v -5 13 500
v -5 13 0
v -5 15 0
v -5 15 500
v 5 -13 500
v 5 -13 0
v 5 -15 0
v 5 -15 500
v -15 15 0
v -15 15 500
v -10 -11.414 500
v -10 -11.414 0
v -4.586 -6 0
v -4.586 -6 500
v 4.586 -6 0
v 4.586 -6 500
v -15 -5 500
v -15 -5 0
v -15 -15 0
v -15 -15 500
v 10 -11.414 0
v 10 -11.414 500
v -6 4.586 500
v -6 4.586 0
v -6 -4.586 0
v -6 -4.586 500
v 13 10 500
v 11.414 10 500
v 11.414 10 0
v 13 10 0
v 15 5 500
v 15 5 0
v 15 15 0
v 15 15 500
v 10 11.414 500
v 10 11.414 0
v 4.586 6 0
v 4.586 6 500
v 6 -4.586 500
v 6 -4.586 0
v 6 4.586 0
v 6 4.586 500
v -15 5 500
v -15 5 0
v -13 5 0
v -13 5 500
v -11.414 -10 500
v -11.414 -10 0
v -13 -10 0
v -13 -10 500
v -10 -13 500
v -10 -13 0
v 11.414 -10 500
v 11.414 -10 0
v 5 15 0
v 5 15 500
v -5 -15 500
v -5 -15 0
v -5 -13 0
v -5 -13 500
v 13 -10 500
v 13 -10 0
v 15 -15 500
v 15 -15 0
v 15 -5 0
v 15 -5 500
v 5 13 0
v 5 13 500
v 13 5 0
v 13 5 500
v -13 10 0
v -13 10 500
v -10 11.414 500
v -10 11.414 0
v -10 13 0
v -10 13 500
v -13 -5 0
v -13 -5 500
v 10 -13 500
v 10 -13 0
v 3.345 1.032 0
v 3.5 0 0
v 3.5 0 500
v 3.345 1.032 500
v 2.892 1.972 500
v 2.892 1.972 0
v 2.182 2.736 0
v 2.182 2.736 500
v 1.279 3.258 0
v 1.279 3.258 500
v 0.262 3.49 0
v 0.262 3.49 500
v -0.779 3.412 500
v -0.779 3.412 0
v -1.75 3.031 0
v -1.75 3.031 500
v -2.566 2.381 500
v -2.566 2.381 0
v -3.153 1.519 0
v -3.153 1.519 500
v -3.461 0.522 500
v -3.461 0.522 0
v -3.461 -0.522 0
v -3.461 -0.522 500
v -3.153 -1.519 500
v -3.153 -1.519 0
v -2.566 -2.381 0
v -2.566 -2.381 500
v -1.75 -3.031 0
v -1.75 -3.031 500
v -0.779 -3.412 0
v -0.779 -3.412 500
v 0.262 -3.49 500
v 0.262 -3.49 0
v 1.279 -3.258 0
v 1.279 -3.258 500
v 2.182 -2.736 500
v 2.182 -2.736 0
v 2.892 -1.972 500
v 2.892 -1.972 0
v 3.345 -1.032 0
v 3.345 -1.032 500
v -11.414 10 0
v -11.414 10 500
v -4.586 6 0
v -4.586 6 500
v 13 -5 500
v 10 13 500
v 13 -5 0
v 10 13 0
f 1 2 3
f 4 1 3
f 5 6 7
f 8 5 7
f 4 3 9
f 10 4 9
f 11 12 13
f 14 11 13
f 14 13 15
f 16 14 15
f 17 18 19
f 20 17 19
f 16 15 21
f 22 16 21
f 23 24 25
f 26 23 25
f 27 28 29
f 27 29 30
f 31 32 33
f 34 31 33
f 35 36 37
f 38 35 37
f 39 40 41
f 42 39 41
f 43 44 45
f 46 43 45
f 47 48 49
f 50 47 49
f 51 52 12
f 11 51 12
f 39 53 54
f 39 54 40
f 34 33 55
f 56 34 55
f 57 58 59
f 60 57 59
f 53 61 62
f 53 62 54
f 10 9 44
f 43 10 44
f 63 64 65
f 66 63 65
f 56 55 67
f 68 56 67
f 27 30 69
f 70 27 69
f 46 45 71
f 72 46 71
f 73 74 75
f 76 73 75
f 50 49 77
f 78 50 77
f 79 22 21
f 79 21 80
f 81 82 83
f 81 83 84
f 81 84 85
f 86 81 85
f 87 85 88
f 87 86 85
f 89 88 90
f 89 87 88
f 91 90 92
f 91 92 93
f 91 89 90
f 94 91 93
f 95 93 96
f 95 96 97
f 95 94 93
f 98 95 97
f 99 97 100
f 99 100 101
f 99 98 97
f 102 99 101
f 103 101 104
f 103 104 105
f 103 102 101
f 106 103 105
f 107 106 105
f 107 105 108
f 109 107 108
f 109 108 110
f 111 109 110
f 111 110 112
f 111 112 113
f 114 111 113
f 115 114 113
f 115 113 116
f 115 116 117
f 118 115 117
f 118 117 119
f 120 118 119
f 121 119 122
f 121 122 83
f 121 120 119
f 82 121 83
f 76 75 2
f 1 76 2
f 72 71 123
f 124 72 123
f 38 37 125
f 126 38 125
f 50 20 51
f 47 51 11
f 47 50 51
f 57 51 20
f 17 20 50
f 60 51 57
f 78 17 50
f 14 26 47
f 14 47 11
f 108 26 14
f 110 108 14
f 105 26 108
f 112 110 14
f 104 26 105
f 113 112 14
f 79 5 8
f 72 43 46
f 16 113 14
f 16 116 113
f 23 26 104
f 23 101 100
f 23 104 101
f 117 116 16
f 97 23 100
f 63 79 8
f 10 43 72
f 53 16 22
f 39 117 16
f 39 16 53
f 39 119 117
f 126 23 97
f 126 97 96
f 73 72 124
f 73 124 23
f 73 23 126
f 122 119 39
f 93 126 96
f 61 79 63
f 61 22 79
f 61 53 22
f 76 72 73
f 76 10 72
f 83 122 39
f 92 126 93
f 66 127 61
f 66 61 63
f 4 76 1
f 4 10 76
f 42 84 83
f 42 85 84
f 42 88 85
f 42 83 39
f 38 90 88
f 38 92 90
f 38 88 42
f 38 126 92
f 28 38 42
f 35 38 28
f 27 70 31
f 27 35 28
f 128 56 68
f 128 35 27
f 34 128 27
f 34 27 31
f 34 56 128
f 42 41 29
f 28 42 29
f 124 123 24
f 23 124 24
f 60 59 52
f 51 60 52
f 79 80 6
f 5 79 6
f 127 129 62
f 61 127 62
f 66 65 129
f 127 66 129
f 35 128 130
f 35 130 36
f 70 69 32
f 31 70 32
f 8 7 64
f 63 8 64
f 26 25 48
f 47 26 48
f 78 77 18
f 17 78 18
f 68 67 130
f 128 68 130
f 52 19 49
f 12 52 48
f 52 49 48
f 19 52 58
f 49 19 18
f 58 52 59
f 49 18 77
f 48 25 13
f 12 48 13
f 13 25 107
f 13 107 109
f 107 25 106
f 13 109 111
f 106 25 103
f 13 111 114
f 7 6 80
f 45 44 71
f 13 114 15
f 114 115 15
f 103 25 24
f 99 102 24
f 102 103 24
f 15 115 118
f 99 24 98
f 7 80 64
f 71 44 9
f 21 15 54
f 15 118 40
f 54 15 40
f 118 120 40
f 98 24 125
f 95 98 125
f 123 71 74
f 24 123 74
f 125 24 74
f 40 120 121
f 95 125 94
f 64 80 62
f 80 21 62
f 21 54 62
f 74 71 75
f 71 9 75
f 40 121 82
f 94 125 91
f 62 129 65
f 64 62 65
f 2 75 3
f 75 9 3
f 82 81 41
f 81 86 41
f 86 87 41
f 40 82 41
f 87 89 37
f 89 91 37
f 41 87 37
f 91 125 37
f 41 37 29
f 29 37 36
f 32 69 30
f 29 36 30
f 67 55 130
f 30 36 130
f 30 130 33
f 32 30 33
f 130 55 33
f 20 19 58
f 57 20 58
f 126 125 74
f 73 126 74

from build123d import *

# Parameters (mm, degrees)
F0_R     = 3.5
F1_DEPTH = 500


with BuildPart() as f1:
    # F0 (on Top) → F1 (new body)
    with BuildSketch(Plane.XY):
        Polygon((4.585786, 6), (-4.585786, 6), (-10, 11.414214), (-10, 13), (-5, 13), (-5, 15), (-15, 15), (-15, 5), (-13, 5), (-13, 10), (-11.414214, 10), (-6, 4.585786), (-6, -4.585786), (-11.414214, -10), (-13, -10), (-13, -5), (-15, -5), (-15, -15), (-5, -15), (-5, -13), (-10, -13), (-10, -11.414214), (-4.585786, -6), (4.585786, -6), (9.999999, -11.414215), (9.999999, -13.000001), (4.999999, -13.000001), (4.999999, -15.000001), (14.999999, -15.000001), (14.999999, -5.000001), (12.999999, -5.000001), (12.999999, -10.000001), (11.414212, -10.000001), (6, -4.585786), (6, 4.585786), (11.414212, 10.000001), (12.999999, 10.000001), (12.999999, 5.000001), (14.999999, 5.000001), (14.999999, 15.000001), (4.999999, 15.000001), (4.999999, 13.000001), (9.999999, 13.000001), (9.999999, 11.414215), align=None)
        Circle(F0_R, mode=Mode.SUBTRACT)
    extrude(amount=F1_DEPTH)


solid = f1.part
